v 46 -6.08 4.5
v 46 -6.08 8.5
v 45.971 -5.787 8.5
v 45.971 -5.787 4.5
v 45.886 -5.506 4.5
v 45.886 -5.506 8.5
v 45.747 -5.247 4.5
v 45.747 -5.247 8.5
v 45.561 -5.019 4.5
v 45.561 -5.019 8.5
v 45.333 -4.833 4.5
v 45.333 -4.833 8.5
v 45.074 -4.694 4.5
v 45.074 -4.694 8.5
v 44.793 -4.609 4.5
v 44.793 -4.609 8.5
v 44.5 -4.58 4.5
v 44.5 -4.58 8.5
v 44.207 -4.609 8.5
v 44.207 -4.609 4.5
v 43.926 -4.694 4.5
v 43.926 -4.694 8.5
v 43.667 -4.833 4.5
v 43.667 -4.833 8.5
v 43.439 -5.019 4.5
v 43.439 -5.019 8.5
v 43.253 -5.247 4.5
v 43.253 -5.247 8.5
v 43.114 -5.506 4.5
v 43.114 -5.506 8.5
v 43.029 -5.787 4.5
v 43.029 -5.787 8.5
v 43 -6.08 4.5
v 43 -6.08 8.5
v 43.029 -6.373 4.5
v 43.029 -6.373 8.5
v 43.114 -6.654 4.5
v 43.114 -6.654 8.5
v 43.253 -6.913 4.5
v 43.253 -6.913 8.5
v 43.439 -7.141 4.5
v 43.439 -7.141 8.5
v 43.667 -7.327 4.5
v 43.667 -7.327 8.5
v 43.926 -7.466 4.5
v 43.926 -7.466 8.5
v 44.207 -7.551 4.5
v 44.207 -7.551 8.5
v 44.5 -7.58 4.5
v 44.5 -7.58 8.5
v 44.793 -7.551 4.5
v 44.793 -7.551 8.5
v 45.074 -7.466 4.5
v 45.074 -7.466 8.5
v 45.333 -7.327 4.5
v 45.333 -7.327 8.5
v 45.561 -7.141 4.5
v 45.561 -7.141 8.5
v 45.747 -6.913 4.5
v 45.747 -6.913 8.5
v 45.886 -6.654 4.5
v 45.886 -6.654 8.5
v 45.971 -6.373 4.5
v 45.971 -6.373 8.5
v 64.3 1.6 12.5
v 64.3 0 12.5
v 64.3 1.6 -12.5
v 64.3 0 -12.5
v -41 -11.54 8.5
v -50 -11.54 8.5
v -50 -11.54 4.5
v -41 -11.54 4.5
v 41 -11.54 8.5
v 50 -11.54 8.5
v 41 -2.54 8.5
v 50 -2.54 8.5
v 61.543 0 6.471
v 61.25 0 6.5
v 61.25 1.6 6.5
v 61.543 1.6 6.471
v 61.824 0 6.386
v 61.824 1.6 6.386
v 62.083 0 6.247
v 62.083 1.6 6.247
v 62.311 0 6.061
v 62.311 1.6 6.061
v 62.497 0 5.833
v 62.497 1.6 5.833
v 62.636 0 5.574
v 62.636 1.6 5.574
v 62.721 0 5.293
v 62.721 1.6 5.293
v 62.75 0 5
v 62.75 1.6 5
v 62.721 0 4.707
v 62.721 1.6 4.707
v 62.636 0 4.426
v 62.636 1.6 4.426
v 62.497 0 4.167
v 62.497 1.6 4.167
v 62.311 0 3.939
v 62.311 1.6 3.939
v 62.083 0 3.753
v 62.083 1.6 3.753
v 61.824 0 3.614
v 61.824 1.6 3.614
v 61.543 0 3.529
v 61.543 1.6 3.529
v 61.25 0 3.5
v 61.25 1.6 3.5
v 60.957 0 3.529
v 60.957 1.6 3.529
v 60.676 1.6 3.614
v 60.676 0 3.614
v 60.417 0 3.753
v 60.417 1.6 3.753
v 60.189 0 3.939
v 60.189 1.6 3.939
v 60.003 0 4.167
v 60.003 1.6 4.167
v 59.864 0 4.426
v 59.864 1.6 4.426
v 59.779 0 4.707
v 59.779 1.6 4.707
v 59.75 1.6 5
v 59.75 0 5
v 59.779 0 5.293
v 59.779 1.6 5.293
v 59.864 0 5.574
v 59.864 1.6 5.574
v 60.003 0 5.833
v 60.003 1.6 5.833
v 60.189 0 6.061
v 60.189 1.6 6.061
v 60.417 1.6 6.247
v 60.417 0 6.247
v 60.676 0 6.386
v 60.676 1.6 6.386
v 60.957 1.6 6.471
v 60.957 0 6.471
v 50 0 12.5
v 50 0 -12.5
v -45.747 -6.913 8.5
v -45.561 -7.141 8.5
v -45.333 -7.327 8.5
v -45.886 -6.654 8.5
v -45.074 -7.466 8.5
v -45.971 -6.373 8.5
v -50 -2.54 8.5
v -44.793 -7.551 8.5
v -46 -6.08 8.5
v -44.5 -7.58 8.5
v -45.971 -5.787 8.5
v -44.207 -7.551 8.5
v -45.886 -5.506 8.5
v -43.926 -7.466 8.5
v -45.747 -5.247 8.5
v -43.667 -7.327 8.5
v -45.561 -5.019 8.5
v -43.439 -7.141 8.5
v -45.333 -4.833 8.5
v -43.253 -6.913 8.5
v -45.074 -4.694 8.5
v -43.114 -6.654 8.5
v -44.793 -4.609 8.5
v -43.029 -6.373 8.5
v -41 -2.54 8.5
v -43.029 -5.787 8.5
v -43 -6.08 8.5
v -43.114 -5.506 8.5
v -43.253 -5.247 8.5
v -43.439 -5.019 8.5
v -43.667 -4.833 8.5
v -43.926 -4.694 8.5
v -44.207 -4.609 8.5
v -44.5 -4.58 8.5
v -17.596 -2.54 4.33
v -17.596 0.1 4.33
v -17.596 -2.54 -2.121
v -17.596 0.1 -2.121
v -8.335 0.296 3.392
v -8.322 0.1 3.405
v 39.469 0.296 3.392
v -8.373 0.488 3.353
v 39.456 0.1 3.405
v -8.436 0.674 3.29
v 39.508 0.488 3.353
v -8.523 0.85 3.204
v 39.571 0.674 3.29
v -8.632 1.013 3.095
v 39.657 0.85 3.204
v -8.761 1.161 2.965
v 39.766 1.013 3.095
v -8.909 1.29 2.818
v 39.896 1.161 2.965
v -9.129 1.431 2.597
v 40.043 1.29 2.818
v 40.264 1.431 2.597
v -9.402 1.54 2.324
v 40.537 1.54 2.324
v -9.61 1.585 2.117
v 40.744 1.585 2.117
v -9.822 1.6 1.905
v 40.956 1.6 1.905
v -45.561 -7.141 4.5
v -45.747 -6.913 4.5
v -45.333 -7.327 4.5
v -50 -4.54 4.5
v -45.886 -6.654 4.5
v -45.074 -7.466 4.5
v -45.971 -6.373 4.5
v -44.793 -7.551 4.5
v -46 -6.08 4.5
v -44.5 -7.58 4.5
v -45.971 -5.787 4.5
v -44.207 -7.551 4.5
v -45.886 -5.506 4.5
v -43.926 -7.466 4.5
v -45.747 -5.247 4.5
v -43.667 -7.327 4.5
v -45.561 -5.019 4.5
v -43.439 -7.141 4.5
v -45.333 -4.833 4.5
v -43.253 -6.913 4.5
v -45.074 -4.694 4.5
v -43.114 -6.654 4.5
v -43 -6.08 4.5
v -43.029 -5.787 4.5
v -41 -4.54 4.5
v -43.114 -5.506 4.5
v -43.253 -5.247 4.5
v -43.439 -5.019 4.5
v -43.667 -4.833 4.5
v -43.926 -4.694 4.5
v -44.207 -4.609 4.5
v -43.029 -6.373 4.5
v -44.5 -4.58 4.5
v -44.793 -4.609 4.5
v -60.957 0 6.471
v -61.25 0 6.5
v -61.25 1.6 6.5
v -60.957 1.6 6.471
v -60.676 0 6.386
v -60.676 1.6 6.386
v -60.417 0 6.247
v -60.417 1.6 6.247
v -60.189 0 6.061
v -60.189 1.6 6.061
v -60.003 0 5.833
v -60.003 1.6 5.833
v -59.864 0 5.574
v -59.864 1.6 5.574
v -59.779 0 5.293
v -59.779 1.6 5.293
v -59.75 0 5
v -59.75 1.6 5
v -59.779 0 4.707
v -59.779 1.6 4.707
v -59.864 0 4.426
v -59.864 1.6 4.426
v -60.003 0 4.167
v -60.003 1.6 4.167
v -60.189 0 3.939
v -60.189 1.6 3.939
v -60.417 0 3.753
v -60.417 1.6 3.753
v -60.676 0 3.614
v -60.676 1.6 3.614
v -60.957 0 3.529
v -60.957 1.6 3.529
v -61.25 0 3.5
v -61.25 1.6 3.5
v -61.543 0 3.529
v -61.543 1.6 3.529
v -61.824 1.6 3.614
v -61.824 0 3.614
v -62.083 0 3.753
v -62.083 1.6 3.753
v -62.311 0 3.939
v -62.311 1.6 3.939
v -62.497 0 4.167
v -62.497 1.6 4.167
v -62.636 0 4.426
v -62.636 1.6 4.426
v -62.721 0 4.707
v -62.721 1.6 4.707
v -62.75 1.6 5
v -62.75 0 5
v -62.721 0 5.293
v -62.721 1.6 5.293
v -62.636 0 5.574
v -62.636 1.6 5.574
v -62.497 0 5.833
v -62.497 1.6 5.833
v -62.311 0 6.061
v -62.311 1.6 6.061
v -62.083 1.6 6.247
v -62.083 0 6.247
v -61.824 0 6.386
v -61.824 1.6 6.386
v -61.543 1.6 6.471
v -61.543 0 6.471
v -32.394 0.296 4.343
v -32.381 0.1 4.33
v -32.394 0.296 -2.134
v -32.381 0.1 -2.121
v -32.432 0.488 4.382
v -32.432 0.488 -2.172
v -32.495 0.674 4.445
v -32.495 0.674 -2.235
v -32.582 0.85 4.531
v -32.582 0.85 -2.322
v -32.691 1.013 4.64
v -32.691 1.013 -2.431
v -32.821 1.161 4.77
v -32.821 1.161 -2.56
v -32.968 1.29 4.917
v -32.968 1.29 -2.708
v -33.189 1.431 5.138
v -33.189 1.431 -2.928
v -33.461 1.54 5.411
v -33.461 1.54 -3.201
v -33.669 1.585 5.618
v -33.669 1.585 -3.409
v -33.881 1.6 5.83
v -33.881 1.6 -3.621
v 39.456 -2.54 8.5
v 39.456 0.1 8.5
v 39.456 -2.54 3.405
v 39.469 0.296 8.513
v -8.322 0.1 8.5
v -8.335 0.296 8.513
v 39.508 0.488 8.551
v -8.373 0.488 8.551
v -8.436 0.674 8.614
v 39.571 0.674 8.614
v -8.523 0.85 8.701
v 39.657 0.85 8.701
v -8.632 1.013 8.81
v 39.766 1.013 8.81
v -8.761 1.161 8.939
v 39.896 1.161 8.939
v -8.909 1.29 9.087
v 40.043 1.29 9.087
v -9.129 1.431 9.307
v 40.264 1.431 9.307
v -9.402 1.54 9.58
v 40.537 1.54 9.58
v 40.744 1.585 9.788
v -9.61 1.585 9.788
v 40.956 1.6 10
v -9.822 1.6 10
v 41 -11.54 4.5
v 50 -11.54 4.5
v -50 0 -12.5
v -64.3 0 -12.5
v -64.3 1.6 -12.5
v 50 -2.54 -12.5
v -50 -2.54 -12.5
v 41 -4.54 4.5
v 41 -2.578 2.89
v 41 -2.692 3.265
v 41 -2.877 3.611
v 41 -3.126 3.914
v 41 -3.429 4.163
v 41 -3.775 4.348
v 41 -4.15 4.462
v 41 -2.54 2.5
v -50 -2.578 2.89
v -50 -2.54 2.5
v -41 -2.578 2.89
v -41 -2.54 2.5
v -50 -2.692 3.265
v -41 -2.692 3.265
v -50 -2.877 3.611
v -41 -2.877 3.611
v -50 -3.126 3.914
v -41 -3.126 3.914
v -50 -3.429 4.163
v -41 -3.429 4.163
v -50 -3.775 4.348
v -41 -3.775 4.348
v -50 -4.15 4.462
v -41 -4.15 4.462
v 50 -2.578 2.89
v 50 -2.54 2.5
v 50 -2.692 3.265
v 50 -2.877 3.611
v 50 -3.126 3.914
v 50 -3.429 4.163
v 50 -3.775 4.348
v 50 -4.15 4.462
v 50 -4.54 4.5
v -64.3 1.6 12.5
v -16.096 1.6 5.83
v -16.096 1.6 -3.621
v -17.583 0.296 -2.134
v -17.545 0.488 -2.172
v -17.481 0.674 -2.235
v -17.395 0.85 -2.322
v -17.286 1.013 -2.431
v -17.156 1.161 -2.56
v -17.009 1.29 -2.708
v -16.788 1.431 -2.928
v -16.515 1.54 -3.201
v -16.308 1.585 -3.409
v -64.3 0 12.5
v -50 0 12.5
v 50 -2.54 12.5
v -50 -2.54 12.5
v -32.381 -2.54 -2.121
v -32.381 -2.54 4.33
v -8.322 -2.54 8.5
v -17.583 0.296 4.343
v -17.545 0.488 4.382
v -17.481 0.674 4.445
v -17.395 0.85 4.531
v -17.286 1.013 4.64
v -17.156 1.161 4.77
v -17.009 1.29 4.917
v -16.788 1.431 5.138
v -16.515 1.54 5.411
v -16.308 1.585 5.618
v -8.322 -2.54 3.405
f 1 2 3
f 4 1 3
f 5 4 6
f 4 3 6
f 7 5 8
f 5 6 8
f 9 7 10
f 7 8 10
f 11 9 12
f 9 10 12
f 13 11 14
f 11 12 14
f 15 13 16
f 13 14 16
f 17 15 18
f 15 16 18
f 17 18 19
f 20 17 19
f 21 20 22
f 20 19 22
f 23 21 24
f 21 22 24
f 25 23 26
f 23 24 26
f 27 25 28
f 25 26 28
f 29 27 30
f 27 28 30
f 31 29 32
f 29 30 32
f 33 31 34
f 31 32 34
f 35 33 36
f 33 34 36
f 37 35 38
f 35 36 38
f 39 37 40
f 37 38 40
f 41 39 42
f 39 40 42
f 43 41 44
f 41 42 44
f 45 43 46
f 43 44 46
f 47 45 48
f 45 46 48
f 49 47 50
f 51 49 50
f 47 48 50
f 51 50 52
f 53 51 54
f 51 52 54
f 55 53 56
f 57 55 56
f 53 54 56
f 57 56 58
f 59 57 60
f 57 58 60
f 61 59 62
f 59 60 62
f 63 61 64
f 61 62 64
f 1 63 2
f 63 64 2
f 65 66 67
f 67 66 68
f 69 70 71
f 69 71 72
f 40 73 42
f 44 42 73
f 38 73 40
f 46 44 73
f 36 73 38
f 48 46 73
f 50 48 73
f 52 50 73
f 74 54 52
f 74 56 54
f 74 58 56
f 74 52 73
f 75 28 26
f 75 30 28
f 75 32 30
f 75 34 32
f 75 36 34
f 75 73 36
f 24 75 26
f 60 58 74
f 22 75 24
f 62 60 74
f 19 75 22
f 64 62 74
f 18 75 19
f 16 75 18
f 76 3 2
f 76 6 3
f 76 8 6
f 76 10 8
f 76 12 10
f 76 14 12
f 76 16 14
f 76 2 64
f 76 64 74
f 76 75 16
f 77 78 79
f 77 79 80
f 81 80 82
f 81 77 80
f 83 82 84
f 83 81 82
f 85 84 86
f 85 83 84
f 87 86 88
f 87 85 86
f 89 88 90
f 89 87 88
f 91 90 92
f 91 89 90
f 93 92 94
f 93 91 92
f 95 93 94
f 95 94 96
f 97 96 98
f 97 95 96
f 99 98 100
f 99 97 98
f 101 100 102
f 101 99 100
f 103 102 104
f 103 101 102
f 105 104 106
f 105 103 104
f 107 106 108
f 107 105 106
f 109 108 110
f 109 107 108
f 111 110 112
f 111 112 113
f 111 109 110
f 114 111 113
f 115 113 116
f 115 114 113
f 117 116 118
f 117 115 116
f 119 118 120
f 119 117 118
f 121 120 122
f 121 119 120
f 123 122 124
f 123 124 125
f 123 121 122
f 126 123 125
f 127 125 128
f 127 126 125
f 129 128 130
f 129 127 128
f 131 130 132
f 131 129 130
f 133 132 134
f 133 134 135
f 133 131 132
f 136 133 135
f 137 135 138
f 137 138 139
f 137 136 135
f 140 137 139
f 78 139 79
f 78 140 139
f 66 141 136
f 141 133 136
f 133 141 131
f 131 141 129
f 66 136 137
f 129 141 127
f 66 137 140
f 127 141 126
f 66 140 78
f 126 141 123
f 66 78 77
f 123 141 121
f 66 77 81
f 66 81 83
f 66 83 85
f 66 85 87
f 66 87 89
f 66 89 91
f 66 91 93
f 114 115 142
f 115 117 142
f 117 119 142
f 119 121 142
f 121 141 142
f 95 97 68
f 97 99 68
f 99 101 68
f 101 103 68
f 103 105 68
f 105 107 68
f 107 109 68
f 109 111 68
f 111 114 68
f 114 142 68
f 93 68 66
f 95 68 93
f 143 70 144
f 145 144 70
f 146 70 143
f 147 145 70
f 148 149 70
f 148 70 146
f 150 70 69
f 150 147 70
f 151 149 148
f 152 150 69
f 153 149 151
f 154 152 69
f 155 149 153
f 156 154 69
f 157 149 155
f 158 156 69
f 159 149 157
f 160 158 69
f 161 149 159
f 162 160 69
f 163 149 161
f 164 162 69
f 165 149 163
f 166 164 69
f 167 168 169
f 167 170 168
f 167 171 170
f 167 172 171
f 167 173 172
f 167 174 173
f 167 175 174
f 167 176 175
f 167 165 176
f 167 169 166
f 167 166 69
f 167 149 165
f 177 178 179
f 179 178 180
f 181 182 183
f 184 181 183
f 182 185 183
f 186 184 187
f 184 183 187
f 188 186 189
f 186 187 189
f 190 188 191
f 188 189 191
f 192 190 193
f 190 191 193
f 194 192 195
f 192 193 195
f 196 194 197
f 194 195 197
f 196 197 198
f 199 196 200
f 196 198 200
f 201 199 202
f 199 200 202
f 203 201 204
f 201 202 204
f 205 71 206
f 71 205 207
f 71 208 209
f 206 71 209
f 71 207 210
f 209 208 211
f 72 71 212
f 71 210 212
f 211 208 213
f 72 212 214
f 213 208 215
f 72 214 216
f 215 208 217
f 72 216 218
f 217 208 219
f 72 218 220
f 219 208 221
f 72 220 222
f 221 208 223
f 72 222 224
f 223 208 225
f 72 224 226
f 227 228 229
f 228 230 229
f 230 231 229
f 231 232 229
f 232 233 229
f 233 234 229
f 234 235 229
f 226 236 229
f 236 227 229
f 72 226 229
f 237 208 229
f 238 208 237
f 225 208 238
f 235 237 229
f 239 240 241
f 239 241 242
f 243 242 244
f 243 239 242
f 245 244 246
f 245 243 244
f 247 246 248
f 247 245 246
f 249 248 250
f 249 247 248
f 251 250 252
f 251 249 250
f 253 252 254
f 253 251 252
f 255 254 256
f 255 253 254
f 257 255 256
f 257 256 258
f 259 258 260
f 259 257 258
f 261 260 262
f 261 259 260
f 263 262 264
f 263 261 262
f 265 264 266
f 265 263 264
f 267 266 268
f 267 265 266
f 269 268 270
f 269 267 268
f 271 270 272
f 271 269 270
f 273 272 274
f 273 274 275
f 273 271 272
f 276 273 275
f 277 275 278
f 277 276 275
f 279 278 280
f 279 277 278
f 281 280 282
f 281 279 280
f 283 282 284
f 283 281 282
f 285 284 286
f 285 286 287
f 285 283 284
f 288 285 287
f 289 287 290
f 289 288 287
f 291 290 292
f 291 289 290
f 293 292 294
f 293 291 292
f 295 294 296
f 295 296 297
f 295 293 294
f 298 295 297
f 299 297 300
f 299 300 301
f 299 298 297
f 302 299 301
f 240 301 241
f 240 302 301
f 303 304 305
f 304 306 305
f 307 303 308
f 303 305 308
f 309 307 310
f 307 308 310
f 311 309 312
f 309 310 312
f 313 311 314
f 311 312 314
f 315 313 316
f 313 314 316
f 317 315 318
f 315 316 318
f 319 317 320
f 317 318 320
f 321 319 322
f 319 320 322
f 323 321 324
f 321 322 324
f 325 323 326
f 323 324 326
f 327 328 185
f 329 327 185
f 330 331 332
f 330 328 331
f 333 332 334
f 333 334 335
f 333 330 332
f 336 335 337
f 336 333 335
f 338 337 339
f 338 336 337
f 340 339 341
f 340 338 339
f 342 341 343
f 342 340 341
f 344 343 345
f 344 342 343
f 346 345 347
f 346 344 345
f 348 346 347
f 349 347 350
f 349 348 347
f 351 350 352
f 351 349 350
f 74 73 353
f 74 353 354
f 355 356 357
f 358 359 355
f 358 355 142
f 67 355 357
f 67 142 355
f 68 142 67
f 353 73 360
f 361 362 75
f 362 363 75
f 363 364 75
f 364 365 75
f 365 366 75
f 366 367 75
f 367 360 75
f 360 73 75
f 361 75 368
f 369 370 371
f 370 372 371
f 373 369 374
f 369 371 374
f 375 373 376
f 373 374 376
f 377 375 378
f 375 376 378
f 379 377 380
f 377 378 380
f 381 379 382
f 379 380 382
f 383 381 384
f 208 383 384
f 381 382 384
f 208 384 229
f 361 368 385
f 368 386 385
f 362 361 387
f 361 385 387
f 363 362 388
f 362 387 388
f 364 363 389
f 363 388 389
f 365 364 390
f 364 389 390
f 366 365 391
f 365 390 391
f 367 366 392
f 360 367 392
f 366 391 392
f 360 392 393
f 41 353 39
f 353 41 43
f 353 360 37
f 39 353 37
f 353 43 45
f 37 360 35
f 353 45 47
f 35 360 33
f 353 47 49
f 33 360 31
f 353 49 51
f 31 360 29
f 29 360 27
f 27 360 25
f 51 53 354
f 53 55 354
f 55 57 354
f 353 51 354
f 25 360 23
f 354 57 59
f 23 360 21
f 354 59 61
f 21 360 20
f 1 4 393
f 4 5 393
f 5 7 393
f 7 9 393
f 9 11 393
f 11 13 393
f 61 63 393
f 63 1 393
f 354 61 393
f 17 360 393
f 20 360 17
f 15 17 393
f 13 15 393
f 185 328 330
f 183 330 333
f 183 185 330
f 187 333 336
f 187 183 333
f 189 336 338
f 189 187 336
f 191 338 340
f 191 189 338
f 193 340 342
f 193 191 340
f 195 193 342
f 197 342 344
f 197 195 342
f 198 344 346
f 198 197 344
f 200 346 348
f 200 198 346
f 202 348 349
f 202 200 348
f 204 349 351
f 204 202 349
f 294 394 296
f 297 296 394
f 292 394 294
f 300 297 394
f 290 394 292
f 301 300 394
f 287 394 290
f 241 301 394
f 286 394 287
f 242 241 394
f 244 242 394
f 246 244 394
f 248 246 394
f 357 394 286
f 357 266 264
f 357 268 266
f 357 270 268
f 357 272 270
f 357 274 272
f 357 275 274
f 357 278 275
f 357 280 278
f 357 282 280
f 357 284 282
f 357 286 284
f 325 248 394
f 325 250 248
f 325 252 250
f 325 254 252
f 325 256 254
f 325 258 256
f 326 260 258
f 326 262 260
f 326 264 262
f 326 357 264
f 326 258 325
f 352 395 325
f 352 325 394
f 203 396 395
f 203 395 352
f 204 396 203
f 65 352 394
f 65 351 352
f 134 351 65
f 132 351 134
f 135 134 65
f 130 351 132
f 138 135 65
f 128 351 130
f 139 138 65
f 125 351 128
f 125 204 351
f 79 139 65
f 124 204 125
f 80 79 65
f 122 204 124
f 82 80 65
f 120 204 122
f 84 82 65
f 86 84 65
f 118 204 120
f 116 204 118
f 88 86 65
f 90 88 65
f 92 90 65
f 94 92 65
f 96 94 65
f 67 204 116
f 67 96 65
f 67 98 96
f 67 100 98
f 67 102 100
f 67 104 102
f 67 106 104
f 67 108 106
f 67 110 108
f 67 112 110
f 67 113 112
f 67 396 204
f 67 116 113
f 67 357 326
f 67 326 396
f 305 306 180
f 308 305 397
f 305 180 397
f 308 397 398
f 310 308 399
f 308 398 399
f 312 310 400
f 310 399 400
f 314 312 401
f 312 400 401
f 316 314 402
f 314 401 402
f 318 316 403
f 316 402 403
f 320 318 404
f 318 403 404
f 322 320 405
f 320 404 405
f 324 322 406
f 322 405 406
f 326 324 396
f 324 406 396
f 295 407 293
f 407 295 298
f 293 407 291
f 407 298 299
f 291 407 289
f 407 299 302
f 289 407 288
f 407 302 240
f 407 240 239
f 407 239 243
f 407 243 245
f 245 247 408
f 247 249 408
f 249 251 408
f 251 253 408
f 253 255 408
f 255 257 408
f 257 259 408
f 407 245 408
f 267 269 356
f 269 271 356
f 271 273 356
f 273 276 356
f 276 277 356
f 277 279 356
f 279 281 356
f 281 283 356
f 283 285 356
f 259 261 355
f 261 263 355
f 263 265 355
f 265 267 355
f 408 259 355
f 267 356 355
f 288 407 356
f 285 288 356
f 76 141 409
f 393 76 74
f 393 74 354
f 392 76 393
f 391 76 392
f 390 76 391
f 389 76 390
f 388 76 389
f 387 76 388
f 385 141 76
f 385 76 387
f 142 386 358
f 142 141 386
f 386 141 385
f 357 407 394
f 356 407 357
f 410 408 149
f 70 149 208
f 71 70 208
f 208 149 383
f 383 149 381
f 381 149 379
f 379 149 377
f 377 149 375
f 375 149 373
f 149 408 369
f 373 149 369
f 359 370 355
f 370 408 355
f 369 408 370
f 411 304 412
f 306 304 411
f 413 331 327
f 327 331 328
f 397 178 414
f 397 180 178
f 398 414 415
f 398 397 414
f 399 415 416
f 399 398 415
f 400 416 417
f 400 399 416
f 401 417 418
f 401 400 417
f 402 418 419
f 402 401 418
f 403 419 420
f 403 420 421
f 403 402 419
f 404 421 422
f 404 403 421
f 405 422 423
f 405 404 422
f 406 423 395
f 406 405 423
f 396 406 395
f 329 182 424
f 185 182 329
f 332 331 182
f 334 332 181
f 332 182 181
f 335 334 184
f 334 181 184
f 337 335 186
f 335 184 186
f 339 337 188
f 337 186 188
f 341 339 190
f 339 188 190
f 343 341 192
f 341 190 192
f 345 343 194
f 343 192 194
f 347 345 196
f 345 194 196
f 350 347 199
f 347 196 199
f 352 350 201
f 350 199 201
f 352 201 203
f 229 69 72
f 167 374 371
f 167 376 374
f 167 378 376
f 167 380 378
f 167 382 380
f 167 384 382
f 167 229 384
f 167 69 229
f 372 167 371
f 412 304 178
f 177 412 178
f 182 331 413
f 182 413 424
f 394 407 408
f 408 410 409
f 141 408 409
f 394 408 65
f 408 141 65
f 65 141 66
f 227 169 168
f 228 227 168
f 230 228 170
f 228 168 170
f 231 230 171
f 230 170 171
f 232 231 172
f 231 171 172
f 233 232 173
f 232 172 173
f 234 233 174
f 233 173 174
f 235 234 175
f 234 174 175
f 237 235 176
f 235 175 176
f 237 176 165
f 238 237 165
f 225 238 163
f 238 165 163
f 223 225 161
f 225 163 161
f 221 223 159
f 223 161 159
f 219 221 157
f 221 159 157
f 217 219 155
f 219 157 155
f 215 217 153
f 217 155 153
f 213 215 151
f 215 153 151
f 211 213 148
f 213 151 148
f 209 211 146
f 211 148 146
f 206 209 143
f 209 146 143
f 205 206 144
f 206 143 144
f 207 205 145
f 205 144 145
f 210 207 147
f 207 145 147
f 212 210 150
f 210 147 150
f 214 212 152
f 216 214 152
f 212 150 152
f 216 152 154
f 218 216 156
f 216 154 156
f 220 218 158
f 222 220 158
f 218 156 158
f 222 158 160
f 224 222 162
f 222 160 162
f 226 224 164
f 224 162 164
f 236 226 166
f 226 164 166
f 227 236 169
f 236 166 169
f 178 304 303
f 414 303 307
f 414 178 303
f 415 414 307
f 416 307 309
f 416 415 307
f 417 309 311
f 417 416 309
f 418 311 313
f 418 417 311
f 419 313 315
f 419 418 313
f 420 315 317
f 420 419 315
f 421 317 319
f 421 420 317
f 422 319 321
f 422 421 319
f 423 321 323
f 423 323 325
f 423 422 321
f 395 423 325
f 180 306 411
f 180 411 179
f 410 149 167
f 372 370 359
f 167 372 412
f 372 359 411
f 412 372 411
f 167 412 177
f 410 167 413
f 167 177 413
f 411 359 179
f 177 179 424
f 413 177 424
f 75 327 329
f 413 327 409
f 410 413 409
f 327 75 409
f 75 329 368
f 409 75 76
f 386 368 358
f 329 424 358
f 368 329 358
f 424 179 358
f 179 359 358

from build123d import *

# Parameters (mm, degrees)
SKETCH1_W           = 128.6
SKETCH1_H           = 25
SKETCH1_R           = 1.5
BOSS_EXTRUDE1_DEPTH = 1.6
SKETCH3_W           = 100
SKETCH3_H           = 25
BOSS_EXTRUDE4_DEPTH = 2.54
SKETCH4_W           = 9
SKETCH4_H           = 9
SKETCH4_R           = 1.5
BOSS_EXTRUDE5_DEPTH = 4
FILLET1_R           = 2
SKETCH5_W           = 47.778525573
SKETCH5_H           = 5.095389146
SKETCH5_W_2         = 14.785547181
SKETCH5_H_2         = 6.451421921
CUT_EXTRUDE1_DEPTH  = 67.808679077
FILLET2_R           = 1.5


with BuildPart() as part:
    # Sketch1 → Boss-Extrude1 (new body)
    with BuildSketch(Plane(origin=(0, 0, 0), x_dir=(1, 0, 0), z_dir=(0, 1, 0))):
        Rectangle(SKETCH1_W, SKETCH1_H)
        with Locations(Location((-61.25, -5, 0), (0, 0, 270))):
            Circle(SKETCH1_R, mode=Mode.SUBTRACT)
        with Locations(Location((61.25, -5, 0), (0, 0, 270))):
            Circle(SKETCH1_R, mode=Mode.SUBTRACT)
    extrude(amount=BOSS_EXTRUDE1_DEPTH)

    # Sketch3 → Boss-Extrude4 (add)
    with BuildSketch(Plane(origin=(0, 0, 0), x_dir=(1, 0, 0), z_dir=(0, 1, 0))):
        Rectangle(SKETCH3_W, SKETCH3_H)
    extrude(amount=-BOSS_EXTRUDE4_DEPTH)

    # Sketch4 → Boss-Extrude5 (add)
    # profile 1 of 2: a face of its own
    with BuildSketch(Plane.XY.offset(8.5)):
        with Locations((-45.5, -7.04)):
            Rectangle(SKETCH4_W, SKETCH4_H)
        with Locations((-44.5, -6.08)):
            Circle(SKETCH4_R, mode=Mode.SUBTRACT)
    # profile 2 of 2: a face of its own
    with BuildSketch(Plane.XY.offset(8.5)):
        with Locations((45.5, -7.04)):
            Rectangle(SKETCH4_W, SKETCH4_H)
        with Locations((44.5, -6.08)):
            Circle(SKETCH4_R, mode=Mode.SUBTRACT)
    extrude(amount=-BOSS_EXTRUDE5_DEPTH)

    # Fillet1
    fillet1_edges = [part.edges().sort_by_distance(p)[0] for p in [
        (-45.5, -2.54, 4.5),
        (45.5, -2.54, 4.5),
    ]]
    fillet(fillet1_edges, radius=FILLET1_R)

    # Sketch5 → Cut-Extrude1 (cut, through all)
    with BuildSketch(Plane(origin=(0, 1.6, 0), x_dir=(1, 0, 0), z_dir=(0, 1, 0))):
        with Locations((15.567152962, -5.952305427)):
            Rectangle(SKETCH5_W, SKETCH5_H)
        with Locations((-24.988389969, -1.104696386)):
            Rectangle(SKETCH5_W_2, SKETCH5_H_2)
    extrude(amount=-CUT_EXTRUDE1_DEPTH, mode=Mode.SUBTRACT)

    # Fillet2
    fillet2_edges = [part.edges().sort_by_distance(p)[0] for p in [
        (-24.988389969, 1.6, 4.330407346),
        (-17.595616378, 1.6, 1.104696385),
        (-24.988389969, 1.6, -2.121014575),
        (-8.322109824, 1.6, 5.952305427),
        (15.567152962, 1.6, 8.5),
        (39.456415749, 1.6, 5.952305427),
        (15.567152962, 1.6, 3.404610854),
        (-32.381163559, 1.6, 1.104696385),
    ]]
    fillet(fillet2_edges, radius=FILLET2_R)


solid = part.part
